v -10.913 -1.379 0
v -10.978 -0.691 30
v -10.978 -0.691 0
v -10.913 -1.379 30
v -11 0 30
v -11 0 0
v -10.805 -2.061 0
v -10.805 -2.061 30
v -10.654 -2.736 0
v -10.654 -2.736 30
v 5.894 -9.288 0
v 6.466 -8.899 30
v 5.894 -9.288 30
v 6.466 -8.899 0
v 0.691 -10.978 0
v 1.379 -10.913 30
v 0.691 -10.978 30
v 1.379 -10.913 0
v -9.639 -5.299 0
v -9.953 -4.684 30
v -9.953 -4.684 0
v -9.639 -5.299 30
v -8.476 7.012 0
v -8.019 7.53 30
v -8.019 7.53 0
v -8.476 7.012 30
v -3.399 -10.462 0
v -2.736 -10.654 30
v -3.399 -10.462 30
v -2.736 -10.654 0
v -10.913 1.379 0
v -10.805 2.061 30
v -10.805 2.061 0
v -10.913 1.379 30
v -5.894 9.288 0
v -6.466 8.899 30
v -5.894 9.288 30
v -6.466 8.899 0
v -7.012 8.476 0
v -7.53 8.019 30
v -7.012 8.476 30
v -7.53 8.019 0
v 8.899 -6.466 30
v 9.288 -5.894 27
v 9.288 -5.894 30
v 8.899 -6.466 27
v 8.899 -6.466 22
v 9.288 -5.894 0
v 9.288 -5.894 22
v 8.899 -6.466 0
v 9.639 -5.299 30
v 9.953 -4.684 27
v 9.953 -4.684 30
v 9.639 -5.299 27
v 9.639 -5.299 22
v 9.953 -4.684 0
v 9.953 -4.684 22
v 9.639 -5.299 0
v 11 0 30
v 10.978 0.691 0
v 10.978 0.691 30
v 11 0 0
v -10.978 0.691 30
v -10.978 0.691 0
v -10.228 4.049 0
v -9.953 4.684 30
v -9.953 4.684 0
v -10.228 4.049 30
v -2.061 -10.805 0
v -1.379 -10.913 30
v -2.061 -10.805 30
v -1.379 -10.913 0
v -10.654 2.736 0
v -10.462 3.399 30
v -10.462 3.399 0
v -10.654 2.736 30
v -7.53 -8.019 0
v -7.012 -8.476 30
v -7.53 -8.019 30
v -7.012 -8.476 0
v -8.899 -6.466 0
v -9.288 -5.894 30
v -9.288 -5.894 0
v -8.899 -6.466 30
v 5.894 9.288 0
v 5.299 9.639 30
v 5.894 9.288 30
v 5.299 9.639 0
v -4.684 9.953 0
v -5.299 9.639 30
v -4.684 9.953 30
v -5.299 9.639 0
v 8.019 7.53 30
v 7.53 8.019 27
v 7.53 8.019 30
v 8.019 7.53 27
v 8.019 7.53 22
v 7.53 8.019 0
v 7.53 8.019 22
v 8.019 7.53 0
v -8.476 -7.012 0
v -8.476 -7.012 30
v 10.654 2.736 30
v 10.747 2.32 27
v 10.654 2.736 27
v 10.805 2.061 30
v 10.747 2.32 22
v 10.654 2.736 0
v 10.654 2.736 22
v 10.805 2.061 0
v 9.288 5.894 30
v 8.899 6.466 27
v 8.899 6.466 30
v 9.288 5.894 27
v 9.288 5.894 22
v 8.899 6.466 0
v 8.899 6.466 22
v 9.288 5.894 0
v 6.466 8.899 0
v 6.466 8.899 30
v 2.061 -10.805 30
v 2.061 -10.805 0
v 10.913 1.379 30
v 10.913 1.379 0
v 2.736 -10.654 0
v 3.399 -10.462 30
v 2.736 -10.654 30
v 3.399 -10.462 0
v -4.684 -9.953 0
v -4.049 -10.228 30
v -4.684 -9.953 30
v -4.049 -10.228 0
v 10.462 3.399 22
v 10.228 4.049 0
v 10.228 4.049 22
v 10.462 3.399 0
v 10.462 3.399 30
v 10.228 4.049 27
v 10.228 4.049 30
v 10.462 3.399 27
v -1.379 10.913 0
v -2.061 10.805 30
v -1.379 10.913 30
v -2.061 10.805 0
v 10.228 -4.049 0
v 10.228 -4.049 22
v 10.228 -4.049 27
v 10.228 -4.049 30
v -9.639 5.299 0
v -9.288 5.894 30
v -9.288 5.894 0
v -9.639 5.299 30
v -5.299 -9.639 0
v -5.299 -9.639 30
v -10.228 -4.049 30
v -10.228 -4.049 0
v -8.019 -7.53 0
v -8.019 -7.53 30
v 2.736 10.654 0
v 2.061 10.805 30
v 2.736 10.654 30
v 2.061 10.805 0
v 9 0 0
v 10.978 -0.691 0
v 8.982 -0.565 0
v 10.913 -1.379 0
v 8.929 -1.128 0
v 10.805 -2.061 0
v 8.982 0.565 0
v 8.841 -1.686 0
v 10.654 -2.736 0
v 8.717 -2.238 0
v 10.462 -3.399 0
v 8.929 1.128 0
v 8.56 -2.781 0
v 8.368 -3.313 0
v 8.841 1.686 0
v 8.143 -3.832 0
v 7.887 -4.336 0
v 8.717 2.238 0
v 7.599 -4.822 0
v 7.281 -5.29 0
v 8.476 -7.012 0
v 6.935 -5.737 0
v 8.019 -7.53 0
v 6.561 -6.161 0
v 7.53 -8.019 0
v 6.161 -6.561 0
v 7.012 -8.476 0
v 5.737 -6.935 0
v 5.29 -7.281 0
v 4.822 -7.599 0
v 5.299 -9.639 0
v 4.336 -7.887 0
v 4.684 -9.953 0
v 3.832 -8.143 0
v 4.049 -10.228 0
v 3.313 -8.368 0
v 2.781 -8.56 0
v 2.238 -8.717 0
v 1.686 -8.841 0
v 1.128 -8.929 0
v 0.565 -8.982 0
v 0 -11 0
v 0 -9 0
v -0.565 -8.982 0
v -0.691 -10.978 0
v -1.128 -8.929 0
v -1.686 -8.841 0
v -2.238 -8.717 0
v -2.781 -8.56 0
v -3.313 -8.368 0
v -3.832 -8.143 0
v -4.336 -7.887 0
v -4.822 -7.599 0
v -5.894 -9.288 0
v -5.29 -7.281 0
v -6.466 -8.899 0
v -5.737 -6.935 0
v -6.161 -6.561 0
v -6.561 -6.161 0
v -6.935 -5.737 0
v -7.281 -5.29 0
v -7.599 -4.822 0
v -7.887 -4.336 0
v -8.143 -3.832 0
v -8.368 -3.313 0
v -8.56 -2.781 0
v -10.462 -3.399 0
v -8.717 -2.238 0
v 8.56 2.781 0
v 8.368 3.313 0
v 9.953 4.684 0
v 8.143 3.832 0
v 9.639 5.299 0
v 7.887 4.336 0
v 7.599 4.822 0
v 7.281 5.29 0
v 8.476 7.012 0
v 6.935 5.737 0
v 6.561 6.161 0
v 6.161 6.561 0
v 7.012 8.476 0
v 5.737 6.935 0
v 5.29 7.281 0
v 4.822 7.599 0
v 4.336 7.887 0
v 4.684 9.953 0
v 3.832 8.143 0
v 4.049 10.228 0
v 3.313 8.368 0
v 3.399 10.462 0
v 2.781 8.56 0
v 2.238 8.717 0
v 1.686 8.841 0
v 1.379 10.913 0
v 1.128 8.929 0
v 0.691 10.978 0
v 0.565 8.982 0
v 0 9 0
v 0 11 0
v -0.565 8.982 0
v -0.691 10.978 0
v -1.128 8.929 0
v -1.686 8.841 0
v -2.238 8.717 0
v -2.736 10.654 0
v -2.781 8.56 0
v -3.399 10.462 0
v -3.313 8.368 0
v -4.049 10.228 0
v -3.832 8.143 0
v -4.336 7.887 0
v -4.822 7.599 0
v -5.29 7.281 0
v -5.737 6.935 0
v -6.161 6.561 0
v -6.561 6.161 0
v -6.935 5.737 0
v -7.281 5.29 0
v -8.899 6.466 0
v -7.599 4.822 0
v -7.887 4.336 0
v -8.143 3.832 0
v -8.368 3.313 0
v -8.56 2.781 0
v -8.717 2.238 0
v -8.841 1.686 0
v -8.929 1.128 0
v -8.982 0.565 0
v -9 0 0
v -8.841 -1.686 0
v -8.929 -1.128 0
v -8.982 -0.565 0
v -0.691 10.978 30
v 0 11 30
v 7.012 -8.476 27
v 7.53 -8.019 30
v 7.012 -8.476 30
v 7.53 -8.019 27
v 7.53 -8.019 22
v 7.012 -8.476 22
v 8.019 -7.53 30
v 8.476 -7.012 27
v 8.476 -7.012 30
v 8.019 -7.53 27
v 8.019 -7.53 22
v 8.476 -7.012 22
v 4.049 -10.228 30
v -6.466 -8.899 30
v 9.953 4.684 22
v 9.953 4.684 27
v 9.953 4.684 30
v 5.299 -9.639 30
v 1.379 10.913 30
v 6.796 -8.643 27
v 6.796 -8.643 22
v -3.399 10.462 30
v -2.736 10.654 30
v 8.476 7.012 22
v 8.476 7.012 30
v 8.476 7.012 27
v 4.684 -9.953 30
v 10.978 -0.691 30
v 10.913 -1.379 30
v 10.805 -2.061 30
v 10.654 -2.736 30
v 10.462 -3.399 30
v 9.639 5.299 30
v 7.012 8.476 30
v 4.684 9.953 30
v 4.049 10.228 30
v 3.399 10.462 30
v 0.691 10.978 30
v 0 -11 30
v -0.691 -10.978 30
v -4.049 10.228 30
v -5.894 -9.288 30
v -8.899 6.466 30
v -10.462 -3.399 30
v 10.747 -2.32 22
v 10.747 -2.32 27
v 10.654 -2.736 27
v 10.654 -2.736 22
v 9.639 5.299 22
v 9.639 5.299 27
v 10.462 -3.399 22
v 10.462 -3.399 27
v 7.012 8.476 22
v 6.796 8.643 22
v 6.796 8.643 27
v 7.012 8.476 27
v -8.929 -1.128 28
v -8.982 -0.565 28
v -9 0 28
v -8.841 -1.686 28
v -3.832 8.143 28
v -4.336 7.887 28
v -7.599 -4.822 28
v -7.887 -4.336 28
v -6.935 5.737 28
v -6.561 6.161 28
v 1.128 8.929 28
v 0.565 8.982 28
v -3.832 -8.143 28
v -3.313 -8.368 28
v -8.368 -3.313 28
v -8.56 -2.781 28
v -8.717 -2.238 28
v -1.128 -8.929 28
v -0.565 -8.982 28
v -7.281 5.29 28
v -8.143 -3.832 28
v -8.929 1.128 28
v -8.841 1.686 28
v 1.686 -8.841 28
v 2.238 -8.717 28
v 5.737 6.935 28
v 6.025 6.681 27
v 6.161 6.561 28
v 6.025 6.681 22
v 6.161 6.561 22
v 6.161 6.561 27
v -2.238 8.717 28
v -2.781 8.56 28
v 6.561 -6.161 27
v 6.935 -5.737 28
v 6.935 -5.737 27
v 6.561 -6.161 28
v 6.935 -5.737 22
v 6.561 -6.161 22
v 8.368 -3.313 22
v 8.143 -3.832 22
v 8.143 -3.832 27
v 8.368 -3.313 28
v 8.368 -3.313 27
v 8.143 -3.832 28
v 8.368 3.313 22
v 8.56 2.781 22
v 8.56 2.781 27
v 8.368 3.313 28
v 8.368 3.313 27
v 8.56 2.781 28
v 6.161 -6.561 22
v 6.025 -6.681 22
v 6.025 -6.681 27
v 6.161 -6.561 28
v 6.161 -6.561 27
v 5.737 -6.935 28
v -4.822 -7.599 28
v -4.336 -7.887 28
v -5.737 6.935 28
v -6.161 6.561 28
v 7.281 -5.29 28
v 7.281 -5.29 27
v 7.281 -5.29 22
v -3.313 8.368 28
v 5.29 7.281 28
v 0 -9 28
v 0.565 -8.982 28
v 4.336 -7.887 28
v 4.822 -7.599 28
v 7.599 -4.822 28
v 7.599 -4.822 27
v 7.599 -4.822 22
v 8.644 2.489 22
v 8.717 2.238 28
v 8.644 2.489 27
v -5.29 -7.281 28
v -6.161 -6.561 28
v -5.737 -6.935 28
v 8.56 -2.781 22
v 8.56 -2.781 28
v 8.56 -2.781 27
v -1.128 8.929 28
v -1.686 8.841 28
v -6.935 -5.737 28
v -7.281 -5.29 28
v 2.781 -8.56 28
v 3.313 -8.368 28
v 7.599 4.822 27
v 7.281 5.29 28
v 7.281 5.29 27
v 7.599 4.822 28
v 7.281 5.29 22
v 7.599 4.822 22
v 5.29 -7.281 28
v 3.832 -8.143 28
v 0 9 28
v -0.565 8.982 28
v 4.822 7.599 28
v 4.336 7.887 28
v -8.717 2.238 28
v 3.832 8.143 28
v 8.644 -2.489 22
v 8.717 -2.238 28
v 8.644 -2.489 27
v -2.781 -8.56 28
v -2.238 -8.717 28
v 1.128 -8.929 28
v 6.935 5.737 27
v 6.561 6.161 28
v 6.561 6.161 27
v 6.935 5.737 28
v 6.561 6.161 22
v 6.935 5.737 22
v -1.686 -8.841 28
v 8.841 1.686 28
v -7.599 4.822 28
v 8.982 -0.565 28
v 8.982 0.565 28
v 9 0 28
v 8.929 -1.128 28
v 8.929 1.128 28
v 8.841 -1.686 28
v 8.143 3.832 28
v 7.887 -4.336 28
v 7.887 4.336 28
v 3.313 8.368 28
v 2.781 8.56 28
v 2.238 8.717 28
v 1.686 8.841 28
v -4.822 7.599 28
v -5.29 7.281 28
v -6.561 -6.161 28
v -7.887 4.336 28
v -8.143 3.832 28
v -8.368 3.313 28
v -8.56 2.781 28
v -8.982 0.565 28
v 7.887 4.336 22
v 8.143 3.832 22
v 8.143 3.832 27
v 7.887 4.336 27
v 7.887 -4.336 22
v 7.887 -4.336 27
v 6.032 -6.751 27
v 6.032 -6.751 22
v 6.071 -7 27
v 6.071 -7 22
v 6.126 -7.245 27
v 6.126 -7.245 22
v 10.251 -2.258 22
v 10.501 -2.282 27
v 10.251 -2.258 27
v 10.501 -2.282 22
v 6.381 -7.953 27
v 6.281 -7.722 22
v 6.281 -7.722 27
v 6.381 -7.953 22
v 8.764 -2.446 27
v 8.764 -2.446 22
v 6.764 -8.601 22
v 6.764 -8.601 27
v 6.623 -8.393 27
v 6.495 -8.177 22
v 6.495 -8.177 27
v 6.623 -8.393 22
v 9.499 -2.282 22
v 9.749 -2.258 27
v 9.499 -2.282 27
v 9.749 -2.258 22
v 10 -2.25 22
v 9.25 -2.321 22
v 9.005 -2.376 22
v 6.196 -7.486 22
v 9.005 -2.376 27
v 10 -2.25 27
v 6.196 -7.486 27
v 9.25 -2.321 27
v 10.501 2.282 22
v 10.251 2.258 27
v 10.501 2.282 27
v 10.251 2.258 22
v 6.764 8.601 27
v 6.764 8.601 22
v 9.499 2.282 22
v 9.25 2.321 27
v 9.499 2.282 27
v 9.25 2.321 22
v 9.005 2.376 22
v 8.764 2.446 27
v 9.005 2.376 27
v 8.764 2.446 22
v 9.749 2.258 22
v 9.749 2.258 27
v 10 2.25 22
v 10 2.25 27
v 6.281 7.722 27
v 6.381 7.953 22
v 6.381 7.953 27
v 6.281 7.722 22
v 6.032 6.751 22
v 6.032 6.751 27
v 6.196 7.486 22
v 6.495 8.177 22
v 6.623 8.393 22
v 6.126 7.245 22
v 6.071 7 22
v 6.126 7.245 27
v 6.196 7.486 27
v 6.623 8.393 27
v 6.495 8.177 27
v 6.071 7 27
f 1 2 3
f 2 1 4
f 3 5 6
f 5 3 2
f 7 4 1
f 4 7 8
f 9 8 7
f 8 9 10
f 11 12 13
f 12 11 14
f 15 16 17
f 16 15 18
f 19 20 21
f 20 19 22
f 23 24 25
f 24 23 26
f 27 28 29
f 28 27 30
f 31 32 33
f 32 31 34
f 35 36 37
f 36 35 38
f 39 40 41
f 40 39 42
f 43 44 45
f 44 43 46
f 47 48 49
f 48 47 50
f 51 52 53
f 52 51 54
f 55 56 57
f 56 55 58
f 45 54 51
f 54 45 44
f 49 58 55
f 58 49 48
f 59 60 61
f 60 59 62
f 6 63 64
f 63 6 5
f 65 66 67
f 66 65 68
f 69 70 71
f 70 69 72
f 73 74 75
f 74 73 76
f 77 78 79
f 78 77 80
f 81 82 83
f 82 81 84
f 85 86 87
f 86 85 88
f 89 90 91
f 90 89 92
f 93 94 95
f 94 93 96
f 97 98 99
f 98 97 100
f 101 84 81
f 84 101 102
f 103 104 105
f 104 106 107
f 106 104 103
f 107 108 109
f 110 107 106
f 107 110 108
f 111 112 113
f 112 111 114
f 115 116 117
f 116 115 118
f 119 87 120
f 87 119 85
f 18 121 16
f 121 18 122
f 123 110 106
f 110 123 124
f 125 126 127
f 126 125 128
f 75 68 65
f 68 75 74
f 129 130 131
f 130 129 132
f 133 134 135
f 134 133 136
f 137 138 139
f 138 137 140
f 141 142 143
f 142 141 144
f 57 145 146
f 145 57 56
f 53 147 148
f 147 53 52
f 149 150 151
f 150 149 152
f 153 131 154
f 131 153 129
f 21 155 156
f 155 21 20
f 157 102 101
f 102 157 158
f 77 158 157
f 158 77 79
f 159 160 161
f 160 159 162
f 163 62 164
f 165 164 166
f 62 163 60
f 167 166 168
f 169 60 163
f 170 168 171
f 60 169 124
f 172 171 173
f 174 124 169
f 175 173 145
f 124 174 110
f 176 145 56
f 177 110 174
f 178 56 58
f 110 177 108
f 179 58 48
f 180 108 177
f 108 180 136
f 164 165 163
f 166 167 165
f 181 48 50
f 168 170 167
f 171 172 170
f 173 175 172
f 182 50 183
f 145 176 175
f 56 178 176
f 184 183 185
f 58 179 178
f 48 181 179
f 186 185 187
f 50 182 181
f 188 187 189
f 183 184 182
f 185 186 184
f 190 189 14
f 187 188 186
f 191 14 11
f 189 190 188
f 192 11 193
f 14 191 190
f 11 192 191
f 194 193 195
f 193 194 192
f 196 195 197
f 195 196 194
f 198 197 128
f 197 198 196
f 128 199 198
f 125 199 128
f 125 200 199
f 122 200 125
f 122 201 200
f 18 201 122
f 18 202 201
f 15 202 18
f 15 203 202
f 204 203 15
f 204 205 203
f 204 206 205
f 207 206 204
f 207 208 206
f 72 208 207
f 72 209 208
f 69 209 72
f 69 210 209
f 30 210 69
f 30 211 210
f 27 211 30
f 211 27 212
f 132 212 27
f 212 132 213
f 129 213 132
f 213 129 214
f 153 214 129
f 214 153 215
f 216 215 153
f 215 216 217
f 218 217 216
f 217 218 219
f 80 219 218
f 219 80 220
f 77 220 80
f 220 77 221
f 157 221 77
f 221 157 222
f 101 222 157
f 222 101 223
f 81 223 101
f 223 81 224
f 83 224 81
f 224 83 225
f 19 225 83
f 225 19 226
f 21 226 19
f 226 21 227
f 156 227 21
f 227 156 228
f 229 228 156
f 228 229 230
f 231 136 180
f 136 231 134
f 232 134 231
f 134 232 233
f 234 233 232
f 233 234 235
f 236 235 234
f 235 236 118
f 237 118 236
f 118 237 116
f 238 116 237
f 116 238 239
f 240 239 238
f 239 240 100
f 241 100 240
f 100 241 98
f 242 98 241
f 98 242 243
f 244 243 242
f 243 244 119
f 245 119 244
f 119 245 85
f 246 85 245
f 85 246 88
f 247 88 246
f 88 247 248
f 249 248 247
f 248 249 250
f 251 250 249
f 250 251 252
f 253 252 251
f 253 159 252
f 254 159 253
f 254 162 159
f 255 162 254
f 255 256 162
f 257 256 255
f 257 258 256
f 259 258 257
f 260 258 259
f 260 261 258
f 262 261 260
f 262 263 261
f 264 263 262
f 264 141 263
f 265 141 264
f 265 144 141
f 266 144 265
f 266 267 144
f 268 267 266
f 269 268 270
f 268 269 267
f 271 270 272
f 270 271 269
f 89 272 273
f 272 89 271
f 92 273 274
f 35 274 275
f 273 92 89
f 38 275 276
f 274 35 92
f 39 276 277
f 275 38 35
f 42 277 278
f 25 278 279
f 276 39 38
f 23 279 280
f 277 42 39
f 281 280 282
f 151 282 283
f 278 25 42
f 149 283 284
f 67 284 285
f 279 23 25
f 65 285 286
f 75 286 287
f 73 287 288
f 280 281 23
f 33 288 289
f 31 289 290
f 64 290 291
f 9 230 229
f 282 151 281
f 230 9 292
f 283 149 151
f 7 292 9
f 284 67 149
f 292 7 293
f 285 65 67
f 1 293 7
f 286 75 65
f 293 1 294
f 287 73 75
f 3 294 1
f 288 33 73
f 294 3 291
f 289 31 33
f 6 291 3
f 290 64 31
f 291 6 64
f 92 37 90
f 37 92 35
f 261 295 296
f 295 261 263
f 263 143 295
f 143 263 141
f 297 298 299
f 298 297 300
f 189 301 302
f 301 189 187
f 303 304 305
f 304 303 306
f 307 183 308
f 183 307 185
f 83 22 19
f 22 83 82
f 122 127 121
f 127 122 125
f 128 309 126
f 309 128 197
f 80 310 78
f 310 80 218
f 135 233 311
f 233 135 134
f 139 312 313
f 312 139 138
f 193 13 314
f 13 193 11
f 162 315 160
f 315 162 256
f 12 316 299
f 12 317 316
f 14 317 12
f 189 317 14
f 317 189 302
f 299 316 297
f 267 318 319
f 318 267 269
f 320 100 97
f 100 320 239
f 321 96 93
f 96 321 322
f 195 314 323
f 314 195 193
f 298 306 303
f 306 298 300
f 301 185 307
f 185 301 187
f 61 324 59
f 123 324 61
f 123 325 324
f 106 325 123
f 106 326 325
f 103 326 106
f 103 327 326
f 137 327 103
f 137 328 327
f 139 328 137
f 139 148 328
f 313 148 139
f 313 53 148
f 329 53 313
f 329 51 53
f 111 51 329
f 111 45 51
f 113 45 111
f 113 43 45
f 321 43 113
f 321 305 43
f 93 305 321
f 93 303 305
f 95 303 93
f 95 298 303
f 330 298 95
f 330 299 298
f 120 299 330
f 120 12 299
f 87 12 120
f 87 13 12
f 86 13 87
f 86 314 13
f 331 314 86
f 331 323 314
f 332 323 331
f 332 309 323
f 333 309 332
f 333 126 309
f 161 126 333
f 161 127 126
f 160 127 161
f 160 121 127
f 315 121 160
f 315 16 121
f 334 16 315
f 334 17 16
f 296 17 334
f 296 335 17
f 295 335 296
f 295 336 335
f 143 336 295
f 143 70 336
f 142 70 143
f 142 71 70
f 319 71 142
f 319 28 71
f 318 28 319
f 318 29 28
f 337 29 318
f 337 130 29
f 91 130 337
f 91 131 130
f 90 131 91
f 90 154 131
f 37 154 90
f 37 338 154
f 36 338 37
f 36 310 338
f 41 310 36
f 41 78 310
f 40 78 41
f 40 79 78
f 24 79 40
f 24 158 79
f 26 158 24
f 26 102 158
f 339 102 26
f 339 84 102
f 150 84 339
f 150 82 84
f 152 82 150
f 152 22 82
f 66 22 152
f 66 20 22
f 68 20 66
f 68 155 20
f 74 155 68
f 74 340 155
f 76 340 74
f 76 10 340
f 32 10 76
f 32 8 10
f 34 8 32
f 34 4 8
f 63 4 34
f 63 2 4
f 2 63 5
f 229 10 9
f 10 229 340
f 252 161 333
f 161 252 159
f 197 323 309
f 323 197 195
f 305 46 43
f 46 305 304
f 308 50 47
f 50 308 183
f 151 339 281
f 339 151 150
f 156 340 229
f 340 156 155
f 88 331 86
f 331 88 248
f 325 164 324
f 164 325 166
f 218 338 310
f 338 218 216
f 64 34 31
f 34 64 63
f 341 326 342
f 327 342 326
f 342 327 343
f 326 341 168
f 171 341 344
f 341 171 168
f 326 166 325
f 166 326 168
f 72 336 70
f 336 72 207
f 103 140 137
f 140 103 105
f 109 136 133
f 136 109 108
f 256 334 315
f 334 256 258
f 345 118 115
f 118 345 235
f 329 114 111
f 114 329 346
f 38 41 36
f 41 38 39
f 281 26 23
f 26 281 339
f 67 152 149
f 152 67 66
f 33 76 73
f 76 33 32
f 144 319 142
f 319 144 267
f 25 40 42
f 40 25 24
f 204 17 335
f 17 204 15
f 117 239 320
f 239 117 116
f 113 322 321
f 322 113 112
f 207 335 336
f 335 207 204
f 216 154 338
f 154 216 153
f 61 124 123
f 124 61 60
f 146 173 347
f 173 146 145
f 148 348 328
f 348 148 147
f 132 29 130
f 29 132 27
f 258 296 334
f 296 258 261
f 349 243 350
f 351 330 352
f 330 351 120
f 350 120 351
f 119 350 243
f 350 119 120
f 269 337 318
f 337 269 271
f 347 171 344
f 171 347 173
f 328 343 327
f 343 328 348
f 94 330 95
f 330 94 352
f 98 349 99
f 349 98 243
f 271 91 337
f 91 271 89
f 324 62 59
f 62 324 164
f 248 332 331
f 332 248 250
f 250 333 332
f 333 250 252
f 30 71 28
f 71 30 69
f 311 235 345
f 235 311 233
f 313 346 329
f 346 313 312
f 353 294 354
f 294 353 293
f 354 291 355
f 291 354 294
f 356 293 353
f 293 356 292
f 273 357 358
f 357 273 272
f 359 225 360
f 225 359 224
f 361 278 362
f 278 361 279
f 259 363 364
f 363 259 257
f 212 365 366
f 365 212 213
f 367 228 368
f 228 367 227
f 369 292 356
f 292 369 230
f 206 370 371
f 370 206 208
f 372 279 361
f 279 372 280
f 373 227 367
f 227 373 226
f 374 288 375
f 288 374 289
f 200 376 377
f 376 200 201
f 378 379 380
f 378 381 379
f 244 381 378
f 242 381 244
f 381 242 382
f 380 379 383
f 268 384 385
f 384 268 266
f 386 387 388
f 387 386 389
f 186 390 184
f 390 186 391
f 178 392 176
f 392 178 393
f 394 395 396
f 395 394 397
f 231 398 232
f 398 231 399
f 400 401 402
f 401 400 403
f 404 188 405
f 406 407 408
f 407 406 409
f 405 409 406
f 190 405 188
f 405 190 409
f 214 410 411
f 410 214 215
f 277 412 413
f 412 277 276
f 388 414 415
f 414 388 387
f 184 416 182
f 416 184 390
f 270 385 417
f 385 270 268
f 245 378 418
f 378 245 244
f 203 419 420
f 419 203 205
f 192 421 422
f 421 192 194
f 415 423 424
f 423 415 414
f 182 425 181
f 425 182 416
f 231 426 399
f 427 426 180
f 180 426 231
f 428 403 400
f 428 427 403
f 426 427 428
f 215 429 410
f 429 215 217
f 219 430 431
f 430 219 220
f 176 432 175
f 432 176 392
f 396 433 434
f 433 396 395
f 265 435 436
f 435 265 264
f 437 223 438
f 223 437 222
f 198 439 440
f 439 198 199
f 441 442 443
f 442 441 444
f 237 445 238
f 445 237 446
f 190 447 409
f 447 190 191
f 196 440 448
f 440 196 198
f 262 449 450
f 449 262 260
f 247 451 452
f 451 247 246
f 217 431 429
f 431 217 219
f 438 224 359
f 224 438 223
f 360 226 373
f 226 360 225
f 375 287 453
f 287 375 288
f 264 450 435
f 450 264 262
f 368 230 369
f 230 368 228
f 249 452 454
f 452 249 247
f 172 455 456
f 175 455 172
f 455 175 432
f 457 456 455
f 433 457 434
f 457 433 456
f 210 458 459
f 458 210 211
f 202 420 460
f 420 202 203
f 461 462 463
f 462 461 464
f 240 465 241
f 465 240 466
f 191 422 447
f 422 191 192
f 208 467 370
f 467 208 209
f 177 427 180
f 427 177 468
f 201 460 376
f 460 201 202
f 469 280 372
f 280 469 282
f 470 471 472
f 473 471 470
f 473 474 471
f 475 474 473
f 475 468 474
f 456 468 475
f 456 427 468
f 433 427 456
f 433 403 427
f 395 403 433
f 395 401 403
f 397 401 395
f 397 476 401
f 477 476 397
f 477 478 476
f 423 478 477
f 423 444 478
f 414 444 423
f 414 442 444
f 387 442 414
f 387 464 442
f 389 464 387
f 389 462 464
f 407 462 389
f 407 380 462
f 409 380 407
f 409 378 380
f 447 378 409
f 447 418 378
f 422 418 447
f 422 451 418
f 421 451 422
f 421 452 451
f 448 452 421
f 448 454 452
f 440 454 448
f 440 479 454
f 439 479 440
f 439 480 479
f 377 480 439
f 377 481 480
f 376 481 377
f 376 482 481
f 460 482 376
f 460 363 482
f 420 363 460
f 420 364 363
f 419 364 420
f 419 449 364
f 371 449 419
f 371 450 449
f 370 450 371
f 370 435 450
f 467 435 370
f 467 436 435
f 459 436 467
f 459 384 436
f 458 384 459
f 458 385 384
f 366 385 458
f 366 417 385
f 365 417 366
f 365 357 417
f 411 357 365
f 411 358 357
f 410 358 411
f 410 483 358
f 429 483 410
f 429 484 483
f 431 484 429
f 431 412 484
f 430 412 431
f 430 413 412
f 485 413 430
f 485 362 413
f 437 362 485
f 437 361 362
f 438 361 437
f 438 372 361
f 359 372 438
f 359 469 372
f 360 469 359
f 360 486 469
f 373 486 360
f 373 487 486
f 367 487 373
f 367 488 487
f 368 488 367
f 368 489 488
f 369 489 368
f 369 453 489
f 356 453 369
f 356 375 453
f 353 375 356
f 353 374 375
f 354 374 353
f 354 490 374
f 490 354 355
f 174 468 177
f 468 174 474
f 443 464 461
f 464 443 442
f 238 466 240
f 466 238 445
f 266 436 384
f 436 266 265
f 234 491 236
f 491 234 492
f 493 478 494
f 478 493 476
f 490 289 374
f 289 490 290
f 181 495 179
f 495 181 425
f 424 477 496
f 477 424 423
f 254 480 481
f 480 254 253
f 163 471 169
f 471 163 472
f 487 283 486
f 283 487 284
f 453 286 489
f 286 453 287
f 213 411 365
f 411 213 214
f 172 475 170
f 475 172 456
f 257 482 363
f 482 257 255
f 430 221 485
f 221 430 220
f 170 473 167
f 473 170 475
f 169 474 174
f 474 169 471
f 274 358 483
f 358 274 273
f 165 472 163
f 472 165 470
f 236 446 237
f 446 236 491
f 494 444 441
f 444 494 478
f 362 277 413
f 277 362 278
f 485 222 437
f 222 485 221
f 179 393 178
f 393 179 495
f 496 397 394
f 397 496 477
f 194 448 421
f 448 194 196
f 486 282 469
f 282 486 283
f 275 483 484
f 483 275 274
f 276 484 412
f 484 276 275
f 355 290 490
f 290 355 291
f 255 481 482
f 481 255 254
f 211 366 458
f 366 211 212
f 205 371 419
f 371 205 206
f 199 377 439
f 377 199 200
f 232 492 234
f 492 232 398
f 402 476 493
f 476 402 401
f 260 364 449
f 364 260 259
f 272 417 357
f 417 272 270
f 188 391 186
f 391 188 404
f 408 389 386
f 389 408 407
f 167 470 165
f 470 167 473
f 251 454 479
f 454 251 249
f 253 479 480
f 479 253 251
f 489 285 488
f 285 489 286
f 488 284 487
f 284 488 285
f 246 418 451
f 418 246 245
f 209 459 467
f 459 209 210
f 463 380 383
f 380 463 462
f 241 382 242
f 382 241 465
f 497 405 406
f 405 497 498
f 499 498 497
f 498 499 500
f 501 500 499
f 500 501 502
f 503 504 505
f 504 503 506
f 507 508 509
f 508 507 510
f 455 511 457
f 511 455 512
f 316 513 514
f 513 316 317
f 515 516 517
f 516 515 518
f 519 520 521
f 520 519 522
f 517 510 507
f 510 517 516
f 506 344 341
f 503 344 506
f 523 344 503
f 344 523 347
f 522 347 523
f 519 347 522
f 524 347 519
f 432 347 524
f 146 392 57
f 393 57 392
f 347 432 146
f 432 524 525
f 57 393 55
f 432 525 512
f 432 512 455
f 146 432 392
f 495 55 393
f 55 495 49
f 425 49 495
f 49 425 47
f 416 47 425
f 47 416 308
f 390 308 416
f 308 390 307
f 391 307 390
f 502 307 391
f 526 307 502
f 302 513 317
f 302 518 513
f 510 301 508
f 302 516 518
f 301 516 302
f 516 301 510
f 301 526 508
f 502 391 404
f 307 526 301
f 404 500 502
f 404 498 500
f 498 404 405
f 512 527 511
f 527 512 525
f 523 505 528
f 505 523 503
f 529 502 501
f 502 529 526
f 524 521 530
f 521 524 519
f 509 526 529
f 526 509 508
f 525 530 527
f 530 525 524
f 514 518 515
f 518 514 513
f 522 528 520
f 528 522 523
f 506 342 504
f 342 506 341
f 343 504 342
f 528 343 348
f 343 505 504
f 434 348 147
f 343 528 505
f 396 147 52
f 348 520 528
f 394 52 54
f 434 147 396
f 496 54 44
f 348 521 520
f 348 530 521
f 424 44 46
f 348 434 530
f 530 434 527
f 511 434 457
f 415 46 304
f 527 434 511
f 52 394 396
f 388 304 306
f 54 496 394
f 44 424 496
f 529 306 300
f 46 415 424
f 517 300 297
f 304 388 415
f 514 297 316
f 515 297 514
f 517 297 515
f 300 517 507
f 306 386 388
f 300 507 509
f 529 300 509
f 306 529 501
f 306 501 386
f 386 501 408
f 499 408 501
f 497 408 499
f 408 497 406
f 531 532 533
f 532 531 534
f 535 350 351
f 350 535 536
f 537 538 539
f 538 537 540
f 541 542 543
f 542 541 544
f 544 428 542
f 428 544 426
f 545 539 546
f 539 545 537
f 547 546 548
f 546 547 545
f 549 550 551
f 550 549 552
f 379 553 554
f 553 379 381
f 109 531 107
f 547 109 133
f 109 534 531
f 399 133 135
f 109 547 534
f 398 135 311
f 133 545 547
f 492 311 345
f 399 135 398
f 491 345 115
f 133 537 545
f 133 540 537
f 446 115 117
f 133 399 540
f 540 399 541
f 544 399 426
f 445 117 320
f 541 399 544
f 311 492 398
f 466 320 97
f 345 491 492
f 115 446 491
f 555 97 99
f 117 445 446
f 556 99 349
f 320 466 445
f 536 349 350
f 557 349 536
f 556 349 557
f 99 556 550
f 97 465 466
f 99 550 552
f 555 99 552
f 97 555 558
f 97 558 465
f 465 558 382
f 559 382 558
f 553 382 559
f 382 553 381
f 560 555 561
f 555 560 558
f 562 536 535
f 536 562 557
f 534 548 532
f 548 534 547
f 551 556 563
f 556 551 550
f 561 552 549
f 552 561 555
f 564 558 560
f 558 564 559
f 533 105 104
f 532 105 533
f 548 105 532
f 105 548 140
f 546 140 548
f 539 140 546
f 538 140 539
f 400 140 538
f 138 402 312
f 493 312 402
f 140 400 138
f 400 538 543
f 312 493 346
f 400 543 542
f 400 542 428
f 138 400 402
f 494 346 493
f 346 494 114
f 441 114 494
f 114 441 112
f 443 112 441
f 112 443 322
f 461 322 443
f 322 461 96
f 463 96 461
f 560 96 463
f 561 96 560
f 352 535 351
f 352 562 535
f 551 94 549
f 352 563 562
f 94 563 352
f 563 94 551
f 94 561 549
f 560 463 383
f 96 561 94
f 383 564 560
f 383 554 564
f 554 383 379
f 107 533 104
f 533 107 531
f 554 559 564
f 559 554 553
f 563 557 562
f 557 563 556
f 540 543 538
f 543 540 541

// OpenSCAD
// This is a parametric case maker for a motor

// to make a custom case, replace the parameters with your own

diameter_of_motor = 18;
thickness_of_case = 2;
// Distance from the front of the motor(not including the spinning end) to the other end (not including the power ends)
height_of_motor = 28; 
// The height from the ground to the first power end when the motor is sideways
height_to_ends = 19; 
diameter_of_ends = 4; 
// Distance on a different axis than "Height To Ends"
distance_between_ends = 12.5;
// The length of the ends protruding out of the motor 
length_of_ends = 5;
// Where along the motor do the ends come out? If it is at the way end, put in 0
distance_to_ends = 7;
// Number of edges on cylinder (use smaller numbers for rendering quickly and higher ones for final output)
resolution = 100;


//program
if (length_of_ends - distance_to_ends >0)
{
rotate ([0,0,180])
difference() {
cylinder(r = (diameter_of_motor/2+thickness_of_case),$fn = resolution, h = (height_of_motor+thickness_of_case));
cylinder(r = (diameter_of_motor/2), h = height_of_motor,$fn = resolution);
translate([diameter_of_motor/2-height_to_ends,distance_between_ends/2,height_of_motor-distance_to_ends/2])
cylinder(r = (diameter_of_ends/2)+thickness_of_case, h = length_of_ends+2 * thickness_of_case, center = true,$fn = resolution);
translate([diameter_of_motor/2-height_to_ends,-distance_between_ends/2,height_of_motor-distance_to_ends/2])
cylinder(r = (diameter_of_ends/2)+thickness_of_case, h = length_of_ends+2 * thickness_of_case, center = true,$fn = resolution);
}
}
else
{
rotate ([0,0,180])
difference() {
cylinder(r = (diameter_of_motor/2+thickness_of_case), h = (height_of_motor+thickness_of_case),$fn = resolution);
cylinder(r = (diameter_of_motor/2), h = height_of_motor,$fn = resolution);
translate([diameter_of_motor/2-height_to_ends,distance_between_ends/2,height_of_motor-distance_to_ends/2])
cylinder(r = (diameter_of_ends/2)+thickness_of_case, h = length_of_ends, center = true,$fn = resolution);
translate([diameter_of_motor/2-height_to_ends,-distance_between_ends/2,height_of_motor-distance_to_ends/2])
cylinder(r = (diameter_of_ends/2)+thickness_of_case, h = length_of_ends, center = true,$fn = resolution);
}
}
